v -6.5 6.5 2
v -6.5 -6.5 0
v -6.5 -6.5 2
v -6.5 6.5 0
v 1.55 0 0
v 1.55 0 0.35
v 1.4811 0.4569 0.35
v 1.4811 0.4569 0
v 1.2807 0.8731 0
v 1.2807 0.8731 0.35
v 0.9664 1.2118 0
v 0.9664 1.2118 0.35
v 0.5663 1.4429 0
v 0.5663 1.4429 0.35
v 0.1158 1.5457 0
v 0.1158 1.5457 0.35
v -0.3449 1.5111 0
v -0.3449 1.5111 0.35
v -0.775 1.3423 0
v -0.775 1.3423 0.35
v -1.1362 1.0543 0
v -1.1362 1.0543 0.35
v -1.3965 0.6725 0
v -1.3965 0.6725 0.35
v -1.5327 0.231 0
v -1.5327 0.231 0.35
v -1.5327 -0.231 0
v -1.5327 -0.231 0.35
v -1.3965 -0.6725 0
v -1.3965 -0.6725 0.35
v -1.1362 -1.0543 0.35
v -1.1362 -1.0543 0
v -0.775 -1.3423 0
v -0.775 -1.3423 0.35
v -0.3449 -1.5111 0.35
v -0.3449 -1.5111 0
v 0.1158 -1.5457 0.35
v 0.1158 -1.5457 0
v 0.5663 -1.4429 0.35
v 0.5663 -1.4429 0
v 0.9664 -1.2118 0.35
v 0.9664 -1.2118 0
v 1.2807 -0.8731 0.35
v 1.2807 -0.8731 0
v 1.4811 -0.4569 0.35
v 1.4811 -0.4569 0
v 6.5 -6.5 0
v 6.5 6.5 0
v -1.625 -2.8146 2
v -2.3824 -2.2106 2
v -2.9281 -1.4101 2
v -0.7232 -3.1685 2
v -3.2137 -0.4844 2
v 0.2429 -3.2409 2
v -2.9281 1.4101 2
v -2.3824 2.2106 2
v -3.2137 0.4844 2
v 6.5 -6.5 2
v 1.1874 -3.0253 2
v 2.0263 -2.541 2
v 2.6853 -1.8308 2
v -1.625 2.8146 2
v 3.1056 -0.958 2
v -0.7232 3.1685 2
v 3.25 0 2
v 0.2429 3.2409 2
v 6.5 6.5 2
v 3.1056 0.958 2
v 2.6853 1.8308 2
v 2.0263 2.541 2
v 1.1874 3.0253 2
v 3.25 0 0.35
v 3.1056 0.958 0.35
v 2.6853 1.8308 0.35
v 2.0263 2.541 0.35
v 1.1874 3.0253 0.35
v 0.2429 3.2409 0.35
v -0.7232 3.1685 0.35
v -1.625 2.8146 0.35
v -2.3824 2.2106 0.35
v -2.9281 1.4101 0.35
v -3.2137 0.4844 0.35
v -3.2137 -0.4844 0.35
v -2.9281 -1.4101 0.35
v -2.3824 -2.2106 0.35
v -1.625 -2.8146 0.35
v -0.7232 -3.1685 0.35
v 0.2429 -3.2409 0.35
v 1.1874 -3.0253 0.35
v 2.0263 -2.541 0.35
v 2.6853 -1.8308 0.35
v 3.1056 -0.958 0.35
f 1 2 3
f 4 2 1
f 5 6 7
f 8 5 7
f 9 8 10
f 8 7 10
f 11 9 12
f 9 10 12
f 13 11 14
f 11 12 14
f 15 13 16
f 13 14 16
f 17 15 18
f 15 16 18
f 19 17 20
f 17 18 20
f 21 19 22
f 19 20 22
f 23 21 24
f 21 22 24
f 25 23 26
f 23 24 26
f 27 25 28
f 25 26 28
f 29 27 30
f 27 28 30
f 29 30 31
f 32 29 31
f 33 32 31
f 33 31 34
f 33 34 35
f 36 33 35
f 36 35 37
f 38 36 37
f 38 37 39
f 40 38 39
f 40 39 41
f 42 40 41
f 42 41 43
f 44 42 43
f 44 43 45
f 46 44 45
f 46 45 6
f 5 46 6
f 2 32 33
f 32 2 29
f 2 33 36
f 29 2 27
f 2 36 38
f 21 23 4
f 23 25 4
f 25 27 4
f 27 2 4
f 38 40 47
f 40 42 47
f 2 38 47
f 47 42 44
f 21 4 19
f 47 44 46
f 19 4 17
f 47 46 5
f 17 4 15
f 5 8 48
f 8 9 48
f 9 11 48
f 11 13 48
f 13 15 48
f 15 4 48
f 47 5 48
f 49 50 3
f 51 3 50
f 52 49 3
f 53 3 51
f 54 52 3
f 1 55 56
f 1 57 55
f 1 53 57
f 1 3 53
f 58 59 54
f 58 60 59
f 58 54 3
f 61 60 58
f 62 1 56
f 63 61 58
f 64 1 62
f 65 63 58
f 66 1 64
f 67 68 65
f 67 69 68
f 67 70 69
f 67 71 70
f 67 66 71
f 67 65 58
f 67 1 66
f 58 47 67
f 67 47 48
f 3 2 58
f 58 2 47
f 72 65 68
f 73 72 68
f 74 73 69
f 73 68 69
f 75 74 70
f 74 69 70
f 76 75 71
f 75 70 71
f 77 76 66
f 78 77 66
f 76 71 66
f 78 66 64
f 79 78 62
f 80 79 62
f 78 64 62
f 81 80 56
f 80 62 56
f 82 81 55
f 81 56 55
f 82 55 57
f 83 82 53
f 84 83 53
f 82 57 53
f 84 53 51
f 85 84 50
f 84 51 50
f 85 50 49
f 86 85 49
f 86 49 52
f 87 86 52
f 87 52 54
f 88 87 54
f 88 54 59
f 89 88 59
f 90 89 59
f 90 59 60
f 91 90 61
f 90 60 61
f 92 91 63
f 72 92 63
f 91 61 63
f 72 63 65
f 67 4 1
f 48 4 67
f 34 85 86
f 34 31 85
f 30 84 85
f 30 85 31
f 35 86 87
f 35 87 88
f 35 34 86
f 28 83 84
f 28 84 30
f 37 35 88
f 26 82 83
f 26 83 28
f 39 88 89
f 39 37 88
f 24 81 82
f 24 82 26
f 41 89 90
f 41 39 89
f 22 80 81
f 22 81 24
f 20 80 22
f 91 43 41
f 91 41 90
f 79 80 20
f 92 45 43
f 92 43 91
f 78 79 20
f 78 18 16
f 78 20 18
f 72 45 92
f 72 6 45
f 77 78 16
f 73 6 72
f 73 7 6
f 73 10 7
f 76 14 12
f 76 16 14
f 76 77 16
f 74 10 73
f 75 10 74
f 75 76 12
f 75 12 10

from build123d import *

# Parameters (mm, degrees)
F0_W     = 13
F0_H     = 13
F1_DEPTH = 2
F2_R     = 3.25
F3_DEPTH = 1.65
F4_R     = 1.55
F5_DEPTH = 1


with BuildPart() as f1:
    # F0 (on Top) → F1 (new body)
    with BuildSketch(Plane.XY):
        Rectangle(F0_W, F0_H)
    extrude(amount=F1_DEPTH)

    # F2 (on face) → F3 (cut)
    with BuildSketch(Plane.XY.offset(2)):
        Circle(F2_R)
    extrude(amount=-F3_DEPTH, mode=Mode.SUBTRACT)

    # F4 (on face) → F5 (cut)
    with BuildSketch(Plane.XY.offset(0.35)):
        Circle(F4_R)
    extrude(amount=-F5_DEPTH, mode=Mode.SUBTRACT)


solid = f1.part
